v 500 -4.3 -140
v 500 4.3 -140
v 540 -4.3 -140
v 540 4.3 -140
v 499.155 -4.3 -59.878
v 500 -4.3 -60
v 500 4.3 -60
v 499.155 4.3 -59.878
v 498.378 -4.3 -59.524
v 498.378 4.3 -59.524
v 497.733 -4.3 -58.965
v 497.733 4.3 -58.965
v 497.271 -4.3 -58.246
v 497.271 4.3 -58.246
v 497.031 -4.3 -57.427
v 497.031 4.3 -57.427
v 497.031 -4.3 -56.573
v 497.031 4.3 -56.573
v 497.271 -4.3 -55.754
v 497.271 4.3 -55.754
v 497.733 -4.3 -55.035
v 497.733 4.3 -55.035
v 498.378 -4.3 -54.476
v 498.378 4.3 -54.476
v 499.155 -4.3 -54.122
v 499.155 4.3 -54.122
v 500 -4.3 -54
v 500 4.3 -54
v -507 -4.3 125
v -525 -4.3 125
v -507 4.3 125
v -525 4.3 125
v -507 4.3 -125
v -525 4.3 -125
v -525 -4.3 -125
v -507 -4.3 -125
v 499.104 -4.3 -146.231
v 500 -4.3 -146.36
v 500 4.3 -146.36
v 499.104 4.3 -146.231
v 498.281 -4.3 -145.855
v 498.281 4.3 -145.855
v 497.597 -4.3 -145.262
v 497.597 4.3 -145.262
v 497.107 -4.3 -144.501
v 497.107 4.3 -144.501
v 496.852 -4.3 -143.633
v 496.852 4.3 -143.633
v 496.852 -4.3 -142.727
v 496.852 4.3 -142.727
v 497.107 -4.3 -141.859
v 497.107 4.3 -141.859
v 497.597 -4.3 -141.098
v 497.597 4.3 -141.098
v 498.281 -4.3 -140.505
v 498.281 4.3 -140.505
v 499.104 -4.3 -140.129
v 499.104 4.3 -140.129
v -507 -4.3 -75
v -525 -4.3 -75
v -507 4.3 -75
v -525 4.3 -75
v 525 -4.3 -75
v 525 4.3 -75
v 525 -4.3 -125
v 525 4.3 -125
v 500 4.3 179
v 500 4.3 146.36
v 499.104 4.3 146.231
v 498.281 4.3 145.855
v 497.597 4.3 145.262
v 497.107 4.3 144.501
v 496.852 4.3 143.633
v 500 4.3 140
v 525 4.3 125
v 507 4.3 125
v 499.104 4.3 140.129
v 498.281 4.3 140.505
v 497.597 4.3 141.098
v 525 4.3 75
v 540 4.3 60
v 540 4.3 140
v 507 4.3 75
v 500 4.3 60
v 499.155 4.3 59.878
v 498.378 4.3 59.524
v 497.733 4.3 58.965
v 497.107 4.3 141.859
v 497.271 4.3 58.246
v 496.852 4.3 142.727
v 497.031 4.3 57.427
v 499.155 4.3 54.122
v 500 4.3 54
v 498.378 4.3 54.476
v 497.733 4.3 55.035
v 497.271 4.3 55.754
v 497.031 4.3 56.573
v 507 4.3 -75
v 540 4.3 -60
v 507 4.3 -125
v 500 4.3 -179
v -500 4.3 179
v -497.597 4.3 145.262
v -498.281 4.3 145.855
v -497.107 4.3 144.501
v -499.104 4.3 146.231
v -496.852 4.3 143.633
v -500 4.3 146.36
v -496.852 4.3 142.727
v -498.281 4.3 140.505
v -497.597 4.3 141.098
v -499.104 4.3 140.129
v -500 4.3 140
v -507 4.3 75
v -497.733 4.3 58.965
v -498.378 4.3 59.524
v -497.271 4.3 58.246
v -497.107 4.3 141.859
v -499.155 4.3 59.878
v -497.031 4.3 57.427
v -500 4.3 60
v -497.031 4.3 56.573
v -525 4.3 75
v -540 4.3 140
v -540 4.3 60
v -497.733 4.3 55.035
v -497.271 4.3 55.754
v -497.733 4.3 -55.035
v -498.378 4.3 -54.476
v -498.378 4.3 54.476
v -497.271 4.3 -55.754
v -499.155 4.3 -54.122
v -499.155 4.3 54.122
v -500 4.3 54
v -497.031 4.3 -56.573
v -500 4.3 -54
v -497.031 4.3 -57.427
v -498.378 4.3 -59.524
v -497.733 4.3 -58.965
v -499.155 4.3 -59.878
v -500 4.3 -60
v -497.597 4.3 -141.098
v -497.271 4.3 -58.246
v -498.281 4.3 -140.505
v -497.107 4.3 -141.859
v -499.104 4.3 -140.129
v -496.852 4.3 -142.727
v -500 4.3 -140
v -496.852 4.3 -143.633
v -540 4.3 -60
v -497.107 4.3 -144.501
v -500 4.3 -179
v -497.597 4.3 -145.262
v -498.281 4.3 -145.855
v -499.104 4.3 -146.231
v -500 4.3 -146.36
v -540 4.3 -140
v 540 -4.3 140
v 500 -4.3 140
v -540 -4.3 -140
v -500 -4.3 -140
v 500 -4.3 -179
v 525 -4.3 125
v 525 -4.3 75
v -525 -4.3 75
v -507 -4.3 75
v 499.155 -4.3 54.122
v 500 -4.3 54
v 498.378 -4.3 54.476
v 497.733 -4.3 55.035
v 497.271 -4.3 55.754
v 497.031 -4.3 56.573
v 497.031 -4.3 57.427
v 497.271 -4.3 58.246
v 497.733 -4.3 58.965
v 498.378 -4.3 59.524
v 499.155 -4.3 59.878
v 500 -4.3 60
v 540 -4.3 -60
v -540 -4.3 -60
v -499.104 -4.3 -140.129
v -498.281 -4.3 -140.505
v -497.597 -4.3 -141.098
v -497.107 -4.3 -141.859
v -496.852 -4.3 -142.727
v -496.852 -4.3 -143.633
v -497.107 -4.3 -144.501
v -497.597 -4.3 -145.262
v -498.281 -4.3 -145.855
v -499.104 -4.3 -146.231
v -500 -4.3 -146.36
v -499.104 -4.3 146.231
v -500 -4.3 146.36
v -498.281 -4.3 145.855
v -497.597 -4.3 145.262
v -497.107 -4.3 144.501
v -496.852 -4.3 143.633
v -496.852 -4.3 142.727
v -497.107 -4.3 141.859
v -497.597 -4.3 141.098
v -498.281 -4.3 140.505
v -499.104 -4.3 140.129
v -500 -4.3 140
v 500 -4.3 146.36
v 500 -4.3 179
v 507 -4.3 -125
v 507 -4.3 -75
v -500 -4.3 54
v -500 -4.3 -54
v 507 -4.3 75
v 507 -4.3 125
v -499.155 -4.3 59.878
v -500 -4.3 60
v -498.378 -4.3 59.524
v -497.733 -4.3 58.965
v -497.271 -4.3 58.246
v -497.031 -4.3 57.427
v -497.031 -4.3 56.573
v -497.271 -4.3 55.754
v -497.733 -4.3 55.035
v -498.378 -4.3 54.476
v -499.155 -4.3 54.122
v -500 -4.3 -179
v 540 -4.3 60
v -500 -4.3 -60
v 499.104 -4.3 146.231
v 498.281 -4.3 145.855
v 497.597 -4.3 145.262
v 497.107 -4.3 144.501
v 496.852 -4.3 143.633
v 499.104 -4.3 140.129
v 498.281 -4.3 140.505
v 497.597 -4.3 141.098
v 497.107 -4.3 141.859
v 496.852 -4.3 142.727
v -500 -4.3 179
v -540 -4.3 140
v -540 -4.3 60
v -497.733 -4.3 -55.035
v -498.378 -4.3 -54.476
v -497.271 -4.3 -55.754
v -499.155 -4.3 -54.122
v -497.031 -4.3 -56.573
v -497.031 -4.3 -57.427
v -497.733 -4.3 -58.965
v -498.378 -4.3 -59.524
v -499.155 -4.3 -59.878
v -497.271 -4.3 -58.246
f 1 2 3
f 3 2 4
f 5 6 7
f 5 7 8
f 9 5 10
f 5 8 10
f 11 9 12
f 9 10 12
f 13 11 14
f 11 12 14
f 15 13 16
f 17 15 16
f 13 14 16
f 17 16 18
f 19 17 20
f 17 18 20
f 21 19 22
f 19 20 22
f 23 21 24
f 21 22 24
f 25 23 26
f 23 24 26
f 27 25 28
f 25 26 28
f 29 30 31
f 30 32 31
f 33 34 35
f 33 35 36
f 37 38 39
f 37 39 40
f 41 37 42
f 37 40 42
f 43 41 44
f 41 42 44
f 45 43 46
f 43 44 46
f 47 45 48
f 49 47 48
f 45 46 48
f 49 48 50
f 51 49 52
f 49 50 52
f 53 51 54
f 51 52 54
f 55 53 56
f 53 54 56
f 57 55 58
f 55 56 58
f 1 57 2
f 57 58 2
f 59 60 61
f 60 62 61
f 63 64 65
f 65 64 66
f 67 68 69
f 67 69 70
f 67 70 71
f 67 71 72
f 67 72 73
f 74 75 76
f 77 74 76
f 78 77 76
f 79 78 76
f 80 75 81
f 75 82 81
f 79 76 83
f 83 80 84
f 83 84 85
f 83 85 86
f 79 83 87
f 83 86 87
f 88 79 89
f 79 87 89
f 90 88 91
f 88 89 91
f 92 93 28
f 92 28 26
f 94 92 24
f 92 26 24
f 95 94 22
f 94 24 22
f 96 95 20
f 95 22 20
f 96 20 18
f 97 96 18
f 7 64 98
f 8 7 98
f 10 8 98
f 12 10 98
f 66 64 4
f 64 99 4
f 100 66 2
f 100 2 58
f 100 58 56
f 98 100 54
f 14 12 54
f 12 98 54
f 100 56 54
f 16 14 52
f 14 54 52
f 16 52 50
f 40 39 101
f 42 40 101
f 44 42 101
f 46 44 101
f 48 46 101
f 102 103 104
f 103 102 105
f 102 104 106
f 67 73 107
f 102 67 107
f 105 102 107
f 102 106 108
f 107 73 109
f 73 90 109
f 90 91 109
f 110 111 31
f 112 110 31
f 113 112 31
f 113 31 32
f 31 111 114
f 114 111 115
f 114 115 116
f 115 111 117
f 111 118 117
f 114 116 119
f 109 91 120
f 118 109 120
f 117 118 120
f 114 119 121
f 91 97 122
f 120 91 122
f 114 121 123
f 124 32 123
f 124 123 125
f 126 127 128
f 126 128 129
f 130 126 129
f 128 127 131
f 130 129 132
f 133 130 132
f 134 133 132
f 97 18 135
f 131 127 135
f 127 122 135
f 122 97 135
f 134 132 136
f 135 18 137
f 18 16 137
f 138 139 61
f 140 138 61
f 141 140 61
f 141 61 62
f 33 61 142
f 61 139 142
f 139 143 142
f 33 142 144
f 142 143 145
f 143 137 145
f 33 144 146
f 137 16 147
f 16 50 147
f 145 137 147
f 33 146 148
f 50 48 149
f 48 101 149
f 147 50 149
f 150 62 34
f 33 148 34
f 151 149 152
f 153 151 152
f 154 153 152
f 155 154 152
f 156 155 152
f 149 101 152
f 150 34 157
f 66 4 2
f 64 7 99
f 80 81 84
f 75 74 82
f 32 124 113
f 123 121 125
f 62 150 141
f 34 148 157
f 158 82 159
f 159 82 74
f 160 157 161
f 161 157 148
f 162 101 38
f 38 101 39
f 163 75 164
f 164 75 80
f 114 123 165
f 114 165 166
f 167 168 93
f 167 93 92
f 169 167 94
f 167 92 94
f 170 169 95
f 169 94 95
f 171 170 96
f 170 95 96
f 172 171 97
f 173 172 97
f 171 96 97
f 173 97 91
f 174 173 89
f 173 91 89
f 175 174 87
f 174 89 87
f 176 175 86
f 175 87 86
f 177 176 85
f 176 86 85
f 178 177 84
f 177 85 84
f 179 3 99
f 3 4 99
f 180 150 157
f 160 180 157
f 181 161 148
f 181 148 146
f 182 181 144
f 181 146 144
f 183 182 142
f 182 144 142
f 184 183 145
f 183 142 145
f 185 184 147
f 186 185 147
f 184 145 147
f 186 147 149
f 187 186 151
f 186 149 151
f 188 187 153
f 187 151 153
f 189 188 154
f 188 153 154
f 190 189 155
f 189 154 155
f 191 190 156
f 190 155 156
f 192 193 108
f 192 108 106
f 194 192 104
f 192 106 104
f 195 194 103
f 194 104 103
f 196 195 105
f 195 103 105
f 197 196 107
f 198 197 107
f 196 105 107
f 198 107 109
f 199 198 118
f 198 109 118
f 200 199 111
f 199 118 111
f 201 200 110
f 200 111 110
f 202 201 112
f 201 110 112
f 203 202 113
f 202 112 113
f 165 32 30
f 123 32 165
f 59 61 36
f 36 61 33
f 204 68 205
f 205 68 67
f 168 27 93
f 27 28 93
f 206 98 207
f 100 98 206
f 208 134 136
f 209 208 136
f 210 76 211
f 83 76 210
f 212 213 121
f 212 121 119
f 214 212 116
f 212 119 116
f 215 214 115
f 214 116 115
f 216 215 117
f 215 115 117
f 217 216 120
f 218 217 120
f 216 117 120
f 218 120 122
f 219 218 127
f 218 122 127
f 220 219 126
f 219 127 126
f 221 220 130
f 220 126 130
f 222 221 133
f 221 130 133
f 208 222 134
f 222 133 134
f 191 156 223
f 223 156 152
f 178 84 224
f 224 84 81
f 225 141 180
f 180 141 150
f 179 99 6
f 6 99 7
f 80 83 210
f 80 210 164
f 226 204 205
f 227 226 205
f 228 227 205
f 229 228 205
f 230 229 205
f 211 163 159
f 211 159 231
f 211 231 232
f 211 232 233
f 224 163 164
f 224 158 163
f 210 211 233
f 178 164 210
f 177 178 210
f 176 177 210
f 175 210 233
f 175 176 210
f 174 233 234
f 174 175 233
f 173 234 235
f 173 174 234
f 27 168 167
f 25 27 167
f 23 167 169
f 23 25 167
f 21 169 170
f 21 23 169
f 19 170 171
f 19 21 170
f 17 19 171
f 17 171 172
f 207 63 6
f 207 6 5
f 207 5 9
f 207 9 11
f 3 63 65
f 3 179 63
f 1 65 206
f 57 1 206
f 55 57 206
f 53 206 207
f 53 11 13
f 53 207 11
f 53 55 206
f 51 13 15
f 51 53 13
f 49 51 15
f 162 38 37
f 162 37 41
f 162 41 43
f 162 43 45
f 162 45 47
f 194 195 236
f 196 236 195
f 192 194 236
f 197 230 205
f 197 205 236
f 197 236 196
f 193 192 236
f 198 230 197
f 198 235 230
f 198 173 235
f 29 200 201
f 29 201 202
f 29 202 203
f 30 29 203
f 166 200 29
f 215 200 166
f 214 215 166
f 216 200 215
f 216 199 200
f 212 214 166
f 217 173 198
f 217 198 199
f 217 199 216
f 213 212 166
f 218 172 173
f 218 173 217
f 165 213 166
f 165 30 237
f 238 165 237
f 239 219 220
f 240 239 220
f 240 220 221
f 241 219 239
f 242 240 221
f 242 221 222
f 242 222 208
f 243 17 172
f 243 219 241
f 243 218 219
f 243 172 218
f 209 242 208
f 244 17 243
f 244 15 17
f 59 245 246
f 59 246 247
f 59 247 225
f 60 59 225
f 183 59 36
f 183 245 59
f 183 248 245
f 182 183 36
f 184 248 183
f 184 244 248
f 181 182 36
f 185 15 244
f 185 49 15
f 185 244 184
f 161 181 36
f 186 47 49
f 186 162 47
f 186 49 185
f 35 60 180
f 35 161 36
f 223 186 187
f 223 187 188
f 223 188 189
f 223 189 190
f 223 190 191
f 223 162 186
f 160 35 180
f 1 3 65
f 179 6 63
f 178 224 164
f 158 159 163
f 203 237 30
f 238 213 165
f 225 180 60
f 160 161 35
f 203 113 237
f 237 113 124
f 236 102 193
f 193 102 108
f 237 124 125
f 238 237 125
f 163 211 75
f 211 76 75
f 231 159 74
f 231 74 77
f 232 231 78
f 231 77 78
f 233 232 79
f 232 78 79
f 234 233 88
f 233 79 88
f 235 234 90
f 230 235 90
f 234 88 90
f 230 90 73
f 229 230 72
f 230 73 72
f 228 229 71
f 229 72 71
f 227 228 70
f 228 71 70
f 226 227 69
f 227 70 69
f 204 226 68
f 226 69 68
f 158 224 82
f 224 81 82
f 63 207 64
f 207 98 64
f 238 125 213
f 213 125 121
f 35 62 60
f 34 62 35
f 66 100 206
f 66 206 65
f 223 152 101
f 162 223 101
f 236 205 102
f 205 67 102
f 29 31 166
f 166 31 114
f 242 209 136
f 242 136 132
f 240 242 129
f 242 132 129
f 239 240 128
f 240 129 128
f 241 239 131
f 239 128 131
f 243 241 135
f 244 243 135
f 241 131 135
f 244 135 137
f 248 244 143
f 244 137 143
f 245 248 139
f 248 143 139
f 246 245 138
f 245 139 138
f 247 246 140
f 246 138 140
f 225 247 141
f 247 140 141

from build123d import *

# Parameters (mm, degrees)
SKETCH1_W           = 18
SKETCH1_H           = 50
BOSS_EXTRUDE1_DEPTH = 4.3


with BuildPart() as part:
    # Sketch1 → Boss-Extrude1 (new body, symmetric)
    with BuildSketch(Plane(origin=(0, 0, 0), x_dir=(1, 0, 0), z_dir=(0, 1, 0))):
        with BuildLine():
            Line((-500, 179), (500, 179))
            Line((500, 179), (500, 146.36))
            ThreePointArc((500, 146.36), (496.82, 143.18), (500, 140))
            Line((500, 140), (540, 140))
            Line((540, 140), (540, 60))
            Line((540, 60), (500, 60))
            ThreePointArc((500, 60), (497, 57), (500, 54))
            Line((500, 54), (500, -54))
            ThreePointArc((500, -54), (497, -57), (500, -60))
            Line((500, -60), (540, -60))
            Line((540, -60), (540, -140))
            Line((540, -140), (500, -140))
            ThreePointArc((500, -140), (496.82, -143.18), (500, -146.36))
            Line((500, -146.36), (500, -179))
            Line((500, -179), (-500, -179))
            Line((-500, -179), (-500, -146.36))
            ThreePointArc((-500, -146.36), (-496.82, -143.18), (-500, -140))
            Line((-500, -140), (-540, -140))
            Line((-540, -140), (-540, -60))
            Line((-540, -60), (-500, -60))
            ThreePointArc((-500, -60), (-497, -57), (-500, -54))
            Line((-500, -54), (-500, 54))
            ThreePointArc((-500, 54), (-497, 57), (-500, 60))
            Line((-500, 60), (-540, 60))
            Line((-540, 60), (-540, 140))
            Line((-540, 140), (-500, 140))
            ThreePointArc((-500, 140), (-496.82, 143.18), (-500, 146.36))
            Line((-500, 146.36), (-500, 179))
        make_face()
        with Locations((-516, 100)):
            Rectangle(SKETCH1_W, SKETCH1_H, mode=Mode.SUBTRACT)
        with Locations((-516, -100)):
            Rectangle(SKETCH1_W, SKETCH1_H, mode=Mode.SUBTRACT)
        with Locations((516, -100)):
            Rectangle(SKETCH1_W, SKETCH1_H, mode=Mode.SUBTRACT)
        with Locations((516, 100)):
            Rectangle(SKETCH1_W, SKETCH1_H, mode=Mode.SUBTRACT)
    extrude(amount=BOSS_EXTRUDE1_DEPTH, both=True)


solid = part.part
